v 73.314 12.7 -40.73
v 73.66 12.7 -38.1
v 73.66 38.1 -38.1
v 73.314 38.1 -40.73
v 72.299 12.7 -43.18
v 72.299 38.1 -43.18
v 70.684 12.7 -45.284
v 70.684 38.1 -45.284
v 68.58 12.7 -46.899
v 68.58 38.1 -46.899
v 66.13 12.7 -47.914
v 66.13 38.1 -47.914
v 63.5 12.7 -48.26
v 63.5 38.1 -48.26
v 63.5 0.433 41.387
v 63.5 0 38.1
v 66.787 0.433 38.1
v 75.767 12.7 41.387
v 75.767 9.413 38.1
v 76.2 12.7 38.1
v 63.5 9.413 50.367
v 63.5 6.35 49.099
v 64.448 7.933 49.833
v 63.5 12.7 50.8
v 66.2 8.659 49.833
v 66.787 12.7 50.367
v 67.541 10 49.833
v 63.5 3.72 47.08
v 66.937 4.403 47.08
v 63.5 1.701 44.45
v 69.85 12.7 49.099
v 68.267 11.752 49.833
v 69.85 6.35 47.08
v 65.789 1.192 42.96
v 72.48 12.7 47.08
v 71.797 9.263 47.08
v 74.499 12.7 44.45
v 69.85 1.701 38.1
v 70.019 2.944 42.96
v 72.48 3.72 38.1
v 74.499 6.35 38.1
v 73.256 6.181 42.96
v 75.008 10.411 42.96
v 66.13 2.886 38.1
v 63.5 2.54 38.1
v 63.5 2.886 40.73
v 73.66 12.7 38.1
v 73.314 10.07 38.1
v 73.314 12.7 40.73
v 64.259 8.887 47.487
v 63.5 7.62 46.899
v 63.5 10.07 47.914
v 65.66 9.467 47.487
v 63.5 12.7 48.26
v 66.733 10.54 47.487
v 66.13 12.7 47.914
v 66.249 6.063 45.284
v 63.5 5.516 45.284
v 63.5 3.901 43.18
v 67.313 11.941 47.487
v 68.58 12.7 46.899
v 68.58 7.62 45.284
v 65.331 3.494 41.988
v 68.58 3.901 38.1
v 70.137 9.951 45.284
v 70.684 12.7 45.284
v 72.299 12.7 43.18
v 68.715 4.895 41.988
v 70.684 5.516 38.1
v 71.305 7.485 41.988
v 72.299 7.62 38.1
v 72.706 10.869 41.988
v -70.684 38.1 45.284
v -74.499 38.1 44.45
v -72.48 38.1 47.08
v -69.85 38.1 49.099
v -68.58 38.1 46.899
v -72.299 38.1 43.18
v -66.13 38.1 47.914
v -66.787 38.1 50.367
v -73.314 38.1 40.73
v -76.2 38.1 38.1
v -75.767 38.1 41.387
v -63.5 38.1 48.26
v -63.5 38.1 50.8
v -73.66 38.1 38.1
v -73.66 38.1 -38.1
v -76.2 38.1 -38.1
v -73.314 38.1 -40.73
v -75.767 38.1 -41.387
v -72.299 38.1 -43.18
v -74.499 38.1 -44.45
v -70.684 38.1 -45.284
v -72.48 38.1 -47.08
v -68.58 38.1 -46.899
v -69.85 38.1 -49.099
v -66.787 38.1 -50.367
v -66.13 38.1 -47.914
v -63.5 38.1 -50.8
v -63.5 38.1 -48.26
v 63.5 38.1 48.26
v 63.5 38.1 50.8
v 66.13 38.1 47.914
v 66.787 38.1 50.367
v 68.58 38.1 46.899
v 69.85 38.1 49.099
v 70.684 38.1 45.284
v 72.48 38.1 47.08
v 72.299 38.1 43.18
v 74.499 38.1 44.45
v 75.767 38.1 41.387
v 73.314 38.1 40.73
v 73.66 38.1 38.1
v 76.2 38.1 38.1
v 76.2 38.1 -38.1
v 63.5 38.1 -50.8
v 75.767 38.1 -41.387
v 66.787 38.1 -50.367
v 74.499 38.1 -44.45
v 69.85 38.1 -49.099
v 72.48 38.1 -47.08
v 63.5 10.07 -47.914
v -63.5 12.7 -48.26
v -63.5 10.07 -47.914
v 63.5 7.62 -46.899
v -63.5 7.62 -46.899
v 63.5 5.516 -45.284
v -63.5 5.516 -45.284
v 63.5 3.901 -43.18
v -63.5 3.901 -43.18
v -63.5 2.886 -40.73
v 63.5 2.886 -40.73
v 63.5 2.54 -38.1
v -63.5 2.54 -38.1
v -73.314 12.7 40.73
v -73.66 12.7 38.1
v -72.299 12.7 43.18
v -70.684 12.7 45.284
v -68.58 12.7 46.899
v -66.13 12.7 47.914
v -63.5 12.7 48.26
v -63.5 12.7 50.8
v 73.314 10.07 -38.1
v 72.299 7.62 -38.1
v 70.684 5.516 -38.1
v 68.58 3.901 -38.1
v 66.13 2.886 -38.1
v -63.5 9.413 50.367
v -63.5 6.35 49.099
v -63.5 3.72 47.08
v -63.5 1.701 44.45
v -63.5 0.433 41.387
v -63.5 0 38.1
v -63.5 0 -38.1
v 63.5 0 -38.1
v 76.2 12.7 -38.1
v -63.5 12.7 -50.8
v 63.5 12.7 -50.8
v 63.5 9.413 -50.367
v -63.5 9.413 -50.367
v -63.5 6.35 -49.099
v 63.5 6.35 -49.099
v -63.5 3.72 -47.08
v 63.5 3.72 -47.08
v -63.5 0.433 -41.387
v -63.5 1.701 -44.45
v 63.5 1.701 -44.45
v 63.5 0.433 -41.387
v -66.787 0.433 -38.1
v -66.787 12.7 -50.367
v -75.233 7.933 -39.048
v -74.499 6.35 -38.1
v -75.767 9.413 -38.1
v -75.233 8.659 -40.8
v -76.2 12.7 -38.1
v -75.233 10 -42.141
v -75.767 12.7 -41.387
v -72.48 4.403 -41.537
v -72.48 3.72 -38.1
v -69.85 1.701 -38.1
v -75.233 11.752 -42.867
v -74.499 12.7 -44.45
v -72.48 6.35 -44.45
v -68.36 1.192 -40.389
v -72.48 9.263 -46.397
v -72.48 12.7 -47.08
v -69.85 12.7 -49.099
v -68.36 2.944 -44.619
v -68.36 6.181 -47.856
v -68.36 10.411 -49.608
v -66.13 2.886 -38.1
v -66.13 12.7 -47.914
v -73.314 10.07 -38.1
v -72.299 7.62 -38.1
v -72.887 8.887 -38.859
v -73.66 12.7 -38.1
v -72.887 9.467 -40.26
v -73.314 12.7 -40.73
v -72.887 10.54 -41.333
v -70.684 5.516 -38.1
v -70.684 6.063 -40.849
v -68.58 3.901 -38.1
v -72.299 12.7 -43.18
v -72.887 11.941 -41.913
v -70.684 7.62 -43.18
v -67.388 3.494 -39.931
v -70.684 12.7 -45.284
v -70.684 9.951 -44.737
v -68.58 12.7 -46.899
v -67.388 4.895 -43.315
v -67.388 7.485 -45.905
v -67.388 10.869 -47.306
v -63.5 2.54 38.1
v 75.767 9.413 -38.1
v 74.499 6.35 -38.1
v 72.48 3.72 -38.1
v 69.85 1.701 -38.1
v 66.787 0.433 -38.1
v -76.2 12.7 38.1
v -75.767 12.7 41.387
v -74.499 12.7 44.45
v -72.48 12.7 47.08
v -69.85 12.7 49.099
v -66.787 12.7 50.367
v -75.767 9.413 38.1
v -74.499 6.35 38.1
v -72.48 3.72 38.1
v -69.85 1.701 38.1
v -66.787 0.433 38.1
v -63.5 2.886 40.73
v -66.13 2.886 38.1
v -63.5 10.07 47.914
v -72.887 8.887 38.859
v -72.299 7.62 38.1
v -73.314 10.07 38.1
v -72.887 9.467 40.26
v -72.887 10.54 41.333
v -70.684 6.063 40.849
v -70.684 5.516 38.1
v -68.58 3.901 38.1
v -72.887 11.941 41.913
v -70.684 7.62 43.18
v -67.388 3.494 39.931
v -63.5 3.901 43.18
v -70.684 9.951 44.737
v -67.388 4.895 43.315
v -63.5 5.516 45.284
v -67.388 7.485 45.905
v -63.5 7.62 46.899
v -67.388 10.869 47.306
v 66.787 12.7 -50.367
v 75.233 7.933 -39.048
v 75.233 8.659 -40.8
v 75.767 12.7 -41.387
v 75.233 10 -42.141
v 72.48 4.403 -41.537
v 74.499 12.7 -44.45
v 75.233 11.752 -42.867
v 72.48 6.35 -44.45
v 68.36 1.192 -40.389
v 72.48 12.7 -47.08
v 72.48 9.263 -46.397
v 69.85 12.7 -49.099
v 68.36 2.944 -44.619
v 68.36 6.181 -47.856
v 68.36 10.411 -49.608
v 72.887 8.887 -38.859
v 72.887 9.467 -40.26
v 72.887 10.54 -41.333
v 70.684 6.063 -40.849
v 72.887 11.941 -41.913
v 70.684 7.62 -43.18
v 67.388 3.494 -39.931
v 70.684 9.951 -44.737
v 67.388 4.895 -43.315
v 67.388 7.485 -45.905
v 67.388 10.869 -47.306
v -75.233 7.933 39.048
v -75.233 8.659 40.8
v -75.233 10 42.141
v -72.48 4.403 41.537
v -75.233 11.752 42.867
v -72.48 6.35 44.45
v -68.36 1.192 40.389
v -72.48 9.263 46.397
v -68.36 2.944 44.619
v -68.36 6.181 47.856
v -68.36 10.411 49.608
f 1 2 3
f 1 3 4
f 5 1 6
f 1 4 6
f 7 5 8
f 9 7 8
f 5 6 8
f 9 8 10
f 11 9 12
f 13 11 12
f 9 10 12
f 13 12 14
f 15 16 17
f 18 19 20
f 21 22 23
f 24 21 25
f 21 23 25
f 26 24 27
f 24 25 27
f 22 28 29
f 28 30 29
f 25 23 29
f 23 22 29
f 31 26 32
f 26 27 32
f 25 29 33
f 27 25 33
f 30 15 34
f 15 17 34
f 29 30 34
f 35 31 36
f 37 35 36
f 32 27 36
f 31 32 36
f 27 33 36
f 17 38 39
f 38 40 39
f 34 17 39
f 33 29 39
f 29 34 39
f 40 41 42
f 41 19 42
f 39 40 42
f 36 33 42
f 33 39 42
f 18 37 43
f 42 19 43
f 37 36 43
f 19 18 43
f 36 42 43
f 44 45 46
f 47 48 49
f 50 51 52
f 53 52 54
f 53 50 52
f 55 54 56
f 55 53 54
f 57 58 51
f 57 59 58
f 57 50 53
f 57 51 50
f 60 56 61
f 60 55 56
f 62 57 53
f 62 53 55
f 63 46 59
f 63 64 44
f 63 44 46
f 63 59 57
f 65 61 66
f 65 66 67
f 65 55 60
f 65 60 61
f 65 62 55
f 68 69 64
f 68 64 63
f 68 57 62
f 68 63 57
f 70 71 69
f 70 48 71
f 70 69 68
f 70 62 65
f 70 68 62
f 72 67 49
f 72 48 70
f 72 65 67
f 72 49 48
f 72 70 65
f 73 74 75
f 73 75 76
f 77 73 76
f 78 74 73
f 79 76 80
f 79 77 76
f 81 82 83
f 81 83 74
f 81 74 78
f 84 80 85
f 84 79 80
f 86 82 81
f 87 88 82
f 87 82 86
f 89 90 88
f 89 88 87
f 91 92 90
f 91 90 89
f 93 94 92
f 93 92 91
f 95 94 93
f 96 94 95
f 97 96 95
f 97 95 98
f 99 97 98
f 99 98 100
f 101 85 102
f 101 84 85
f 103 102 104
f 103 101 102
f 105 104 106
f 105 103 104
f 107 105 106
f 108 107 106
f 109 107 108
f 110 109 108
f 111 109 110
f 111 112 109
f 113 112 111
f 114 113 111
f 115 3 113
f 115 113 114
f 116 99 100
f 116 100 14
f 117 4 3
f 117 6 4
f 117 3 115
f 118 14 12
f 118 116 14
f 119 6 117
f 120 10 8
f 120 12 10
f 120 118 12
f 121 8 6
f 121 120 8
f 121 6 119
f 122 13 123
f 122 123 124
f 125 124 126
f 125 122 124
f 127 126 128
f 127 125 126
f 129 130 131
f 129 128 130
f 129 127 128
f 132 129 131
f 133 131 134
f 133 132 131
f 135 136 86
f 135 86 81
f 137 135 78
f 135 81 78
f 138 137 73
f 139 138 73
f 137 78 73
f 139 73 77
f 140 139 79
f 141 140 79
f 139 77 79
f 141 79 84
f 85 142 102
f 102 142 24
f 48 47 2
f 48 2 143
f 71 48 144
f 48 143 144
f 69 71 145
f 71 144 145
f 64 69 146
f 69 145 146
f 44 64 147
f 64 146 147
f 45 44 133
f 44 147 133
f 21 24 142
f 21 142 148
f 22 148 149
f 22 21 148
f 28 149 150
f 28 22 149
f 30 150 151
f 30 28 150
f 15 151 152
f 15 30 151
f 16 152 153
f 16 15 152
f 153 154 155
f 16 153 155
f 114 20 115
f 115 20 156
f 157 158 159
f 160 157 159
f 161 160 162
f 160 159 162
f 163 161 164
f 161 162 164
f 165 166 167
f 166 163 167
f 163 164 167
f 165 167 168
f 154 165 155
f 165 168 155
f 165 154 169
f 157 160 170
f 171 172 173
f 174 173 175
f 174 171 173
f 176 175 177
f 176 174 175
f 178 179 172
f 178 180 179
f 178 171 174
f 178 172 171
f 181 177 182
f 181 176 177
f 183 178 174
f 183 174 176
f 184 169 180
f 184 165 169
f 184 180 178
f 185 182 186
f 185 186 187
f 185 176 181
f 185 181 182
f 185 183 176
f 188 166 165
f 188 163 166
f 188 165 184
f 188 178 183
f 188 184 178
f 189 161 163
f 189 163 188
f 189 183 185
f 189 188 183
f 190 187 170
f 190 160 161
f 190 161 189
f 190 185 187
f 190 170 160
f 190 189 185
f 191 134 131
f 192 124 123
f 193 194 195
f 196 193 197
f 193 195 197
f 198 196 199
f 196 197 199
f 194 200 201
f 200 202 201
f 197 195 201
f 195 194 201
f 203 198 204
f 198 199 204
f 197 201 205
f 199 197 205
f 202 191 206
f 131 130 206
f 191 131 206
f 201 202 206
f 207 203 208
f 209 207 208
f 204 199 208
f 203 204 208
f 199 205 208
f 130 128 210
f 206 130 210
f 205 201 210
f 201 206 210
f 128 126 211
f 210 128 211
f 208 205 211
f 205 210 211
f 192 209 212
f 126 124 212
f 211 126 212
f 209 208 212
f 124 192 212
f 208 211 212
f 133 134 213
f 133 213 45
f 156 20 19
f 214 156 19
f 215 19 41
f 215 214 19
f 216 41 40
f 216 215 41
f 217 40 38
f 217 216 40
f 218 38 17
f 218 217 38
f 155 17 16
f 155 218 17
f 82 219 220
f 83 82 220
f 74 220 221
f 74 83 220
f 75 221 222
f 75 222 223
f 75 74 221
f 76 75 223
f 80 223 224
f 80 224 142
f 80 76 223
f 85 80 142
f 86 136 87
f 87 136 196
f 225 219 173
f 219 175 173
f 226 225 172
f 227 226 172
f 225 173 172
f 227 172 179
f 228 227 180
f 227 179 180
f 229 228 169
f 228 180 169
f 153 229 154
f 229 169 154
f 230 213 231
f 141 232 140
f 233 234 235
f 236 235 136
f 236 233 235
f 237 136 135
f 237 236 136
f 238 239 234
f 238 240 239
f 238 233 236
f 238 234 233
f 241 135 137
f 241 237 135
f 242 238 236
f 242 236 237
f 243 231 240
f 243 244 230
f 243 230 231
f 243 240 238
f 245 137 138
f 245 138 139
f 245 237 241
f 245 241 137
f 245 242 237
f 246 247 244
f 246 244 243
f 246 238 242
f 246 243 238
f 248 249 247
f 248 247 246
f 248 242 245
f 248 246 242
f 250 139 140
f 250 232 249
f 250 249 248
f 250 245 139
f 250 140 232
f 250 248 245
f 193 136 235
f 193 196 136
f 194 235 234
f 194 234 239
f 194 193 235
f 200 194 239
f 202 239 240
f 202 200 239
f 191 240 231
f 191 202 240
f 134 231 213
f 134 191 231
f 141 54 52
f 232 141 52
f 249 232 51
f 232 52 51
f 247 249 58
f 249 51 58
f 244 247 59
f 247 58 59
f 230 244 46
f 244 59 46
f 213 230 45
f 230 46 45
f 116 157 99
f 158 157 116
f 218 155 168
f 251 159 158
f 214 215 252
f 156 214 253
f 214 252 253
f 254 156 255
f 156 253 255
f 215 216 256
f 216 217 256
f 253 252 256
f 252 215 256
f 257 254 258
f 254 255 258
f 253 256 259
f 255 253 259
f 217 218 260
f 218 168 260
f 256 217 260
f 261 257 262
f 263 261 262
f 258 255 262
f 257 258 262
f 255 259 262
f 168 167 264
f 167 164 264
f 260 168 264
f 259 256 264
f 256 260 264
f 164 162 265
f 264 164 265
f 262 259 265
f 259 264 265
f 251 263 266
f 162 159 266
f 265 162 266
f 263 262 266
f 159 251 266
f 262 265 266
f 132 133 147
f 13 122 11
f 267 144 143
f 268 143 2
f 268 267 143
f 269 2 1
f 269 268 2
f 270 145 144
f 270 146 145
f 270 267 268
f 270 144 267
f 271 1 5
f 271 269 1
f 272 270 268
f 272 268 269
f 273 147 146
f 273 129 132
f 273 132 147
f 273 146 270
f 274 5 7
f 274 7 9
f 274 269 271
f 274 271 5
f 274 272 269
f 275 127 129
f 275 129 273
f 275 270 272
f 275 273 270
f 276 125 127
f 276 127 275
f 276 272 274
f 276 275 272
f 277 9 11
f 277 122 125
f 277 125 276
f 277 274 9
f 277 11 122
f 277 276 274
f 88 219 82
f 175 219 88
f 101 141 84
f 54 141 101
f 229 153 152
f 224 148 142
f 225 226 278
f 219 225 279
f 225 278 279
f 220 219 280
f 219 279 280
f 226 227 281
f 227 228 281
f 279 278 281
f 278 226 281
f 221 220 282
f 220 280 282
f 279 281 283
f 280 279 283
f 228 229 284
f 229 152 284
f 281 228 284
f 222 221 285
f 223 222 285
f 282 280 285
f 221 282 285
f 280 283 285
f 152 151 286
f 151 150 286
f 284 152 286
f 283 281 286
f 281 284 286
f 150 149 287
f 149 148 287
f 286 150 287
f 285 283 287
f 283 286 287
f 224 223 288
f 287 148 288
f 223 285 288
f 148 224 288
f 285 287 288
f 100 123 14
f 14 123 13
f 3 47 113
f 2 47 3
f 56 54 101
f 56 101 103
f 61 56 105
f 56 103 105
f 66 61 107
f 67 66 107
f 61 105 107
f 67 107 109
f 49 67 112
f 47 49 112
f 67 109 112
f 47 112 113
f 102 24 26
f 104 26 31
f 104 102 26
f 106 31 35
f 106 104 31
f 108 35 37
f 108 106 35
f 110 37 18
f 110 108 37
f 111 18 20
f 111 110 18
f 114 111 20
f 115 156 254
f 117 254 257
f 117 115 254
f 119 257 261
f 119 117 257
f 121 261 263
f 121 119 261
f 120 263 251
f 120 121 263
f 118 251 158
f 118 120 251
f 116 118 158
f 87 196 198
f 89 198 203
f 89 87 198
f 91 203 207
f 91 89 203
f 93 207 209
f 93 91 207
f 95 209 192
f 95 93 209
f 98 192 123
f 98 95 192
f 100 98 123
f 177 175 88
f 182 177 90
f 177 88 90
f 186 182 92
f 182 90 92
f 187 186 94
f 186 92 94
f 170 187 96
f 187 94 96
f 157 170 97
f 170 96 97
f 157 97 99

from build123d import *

# Parameters (mm, degrees)
CROQUIS1_W              = 152.4
CROQUIS1_H              = 101.6
SALIENTE_EXTRUIR1_DEPTH = 38.1
REDONDEO1_R             = 12.7
VACIADO1_T              = -2.54


with BuildPart() as part:
    # Croquis1 → Saliente-Extruir1 (new body)
    with BuildSketch(Plane(origin=(0, 0, 0), x_dir=(1, 0, 0), z_dir=(0, 1, 0))):
        Rectangle(CROQUIS1_W, CROQUIS1_H)
    extrude(amount=SALIENTE_EXTRUIR1_DEPTH)

    # Redondeo1
    redondeo1_edges = [part.edges().sort_by_distance(p)[0] for p in [
        (0, 0, -50.8),
        (76.2, 0, 0),
        (0, 0, 50.8),
        (-76.2, 0, 0),
        (-76.2, 19.05, -50.8),
        (76.2, 19.05, -50.8),
        (76.2, 19.05, 50.8),
        (-76.2, 19.05, 50.8),
    ]]
    fillet(redondeo1_edges, radius=REDONDEO1_R)

    # Vaciado1
    vaciado1_openings = [part.faces().sort_by_distance(p)[0] for p in [
        (0, 38.1, 0),
    ]]
    offset(amount=VACIADO1_T, openings=vaciado1_openings, kind=Kind.INTERSECTION)


solid = part.part
